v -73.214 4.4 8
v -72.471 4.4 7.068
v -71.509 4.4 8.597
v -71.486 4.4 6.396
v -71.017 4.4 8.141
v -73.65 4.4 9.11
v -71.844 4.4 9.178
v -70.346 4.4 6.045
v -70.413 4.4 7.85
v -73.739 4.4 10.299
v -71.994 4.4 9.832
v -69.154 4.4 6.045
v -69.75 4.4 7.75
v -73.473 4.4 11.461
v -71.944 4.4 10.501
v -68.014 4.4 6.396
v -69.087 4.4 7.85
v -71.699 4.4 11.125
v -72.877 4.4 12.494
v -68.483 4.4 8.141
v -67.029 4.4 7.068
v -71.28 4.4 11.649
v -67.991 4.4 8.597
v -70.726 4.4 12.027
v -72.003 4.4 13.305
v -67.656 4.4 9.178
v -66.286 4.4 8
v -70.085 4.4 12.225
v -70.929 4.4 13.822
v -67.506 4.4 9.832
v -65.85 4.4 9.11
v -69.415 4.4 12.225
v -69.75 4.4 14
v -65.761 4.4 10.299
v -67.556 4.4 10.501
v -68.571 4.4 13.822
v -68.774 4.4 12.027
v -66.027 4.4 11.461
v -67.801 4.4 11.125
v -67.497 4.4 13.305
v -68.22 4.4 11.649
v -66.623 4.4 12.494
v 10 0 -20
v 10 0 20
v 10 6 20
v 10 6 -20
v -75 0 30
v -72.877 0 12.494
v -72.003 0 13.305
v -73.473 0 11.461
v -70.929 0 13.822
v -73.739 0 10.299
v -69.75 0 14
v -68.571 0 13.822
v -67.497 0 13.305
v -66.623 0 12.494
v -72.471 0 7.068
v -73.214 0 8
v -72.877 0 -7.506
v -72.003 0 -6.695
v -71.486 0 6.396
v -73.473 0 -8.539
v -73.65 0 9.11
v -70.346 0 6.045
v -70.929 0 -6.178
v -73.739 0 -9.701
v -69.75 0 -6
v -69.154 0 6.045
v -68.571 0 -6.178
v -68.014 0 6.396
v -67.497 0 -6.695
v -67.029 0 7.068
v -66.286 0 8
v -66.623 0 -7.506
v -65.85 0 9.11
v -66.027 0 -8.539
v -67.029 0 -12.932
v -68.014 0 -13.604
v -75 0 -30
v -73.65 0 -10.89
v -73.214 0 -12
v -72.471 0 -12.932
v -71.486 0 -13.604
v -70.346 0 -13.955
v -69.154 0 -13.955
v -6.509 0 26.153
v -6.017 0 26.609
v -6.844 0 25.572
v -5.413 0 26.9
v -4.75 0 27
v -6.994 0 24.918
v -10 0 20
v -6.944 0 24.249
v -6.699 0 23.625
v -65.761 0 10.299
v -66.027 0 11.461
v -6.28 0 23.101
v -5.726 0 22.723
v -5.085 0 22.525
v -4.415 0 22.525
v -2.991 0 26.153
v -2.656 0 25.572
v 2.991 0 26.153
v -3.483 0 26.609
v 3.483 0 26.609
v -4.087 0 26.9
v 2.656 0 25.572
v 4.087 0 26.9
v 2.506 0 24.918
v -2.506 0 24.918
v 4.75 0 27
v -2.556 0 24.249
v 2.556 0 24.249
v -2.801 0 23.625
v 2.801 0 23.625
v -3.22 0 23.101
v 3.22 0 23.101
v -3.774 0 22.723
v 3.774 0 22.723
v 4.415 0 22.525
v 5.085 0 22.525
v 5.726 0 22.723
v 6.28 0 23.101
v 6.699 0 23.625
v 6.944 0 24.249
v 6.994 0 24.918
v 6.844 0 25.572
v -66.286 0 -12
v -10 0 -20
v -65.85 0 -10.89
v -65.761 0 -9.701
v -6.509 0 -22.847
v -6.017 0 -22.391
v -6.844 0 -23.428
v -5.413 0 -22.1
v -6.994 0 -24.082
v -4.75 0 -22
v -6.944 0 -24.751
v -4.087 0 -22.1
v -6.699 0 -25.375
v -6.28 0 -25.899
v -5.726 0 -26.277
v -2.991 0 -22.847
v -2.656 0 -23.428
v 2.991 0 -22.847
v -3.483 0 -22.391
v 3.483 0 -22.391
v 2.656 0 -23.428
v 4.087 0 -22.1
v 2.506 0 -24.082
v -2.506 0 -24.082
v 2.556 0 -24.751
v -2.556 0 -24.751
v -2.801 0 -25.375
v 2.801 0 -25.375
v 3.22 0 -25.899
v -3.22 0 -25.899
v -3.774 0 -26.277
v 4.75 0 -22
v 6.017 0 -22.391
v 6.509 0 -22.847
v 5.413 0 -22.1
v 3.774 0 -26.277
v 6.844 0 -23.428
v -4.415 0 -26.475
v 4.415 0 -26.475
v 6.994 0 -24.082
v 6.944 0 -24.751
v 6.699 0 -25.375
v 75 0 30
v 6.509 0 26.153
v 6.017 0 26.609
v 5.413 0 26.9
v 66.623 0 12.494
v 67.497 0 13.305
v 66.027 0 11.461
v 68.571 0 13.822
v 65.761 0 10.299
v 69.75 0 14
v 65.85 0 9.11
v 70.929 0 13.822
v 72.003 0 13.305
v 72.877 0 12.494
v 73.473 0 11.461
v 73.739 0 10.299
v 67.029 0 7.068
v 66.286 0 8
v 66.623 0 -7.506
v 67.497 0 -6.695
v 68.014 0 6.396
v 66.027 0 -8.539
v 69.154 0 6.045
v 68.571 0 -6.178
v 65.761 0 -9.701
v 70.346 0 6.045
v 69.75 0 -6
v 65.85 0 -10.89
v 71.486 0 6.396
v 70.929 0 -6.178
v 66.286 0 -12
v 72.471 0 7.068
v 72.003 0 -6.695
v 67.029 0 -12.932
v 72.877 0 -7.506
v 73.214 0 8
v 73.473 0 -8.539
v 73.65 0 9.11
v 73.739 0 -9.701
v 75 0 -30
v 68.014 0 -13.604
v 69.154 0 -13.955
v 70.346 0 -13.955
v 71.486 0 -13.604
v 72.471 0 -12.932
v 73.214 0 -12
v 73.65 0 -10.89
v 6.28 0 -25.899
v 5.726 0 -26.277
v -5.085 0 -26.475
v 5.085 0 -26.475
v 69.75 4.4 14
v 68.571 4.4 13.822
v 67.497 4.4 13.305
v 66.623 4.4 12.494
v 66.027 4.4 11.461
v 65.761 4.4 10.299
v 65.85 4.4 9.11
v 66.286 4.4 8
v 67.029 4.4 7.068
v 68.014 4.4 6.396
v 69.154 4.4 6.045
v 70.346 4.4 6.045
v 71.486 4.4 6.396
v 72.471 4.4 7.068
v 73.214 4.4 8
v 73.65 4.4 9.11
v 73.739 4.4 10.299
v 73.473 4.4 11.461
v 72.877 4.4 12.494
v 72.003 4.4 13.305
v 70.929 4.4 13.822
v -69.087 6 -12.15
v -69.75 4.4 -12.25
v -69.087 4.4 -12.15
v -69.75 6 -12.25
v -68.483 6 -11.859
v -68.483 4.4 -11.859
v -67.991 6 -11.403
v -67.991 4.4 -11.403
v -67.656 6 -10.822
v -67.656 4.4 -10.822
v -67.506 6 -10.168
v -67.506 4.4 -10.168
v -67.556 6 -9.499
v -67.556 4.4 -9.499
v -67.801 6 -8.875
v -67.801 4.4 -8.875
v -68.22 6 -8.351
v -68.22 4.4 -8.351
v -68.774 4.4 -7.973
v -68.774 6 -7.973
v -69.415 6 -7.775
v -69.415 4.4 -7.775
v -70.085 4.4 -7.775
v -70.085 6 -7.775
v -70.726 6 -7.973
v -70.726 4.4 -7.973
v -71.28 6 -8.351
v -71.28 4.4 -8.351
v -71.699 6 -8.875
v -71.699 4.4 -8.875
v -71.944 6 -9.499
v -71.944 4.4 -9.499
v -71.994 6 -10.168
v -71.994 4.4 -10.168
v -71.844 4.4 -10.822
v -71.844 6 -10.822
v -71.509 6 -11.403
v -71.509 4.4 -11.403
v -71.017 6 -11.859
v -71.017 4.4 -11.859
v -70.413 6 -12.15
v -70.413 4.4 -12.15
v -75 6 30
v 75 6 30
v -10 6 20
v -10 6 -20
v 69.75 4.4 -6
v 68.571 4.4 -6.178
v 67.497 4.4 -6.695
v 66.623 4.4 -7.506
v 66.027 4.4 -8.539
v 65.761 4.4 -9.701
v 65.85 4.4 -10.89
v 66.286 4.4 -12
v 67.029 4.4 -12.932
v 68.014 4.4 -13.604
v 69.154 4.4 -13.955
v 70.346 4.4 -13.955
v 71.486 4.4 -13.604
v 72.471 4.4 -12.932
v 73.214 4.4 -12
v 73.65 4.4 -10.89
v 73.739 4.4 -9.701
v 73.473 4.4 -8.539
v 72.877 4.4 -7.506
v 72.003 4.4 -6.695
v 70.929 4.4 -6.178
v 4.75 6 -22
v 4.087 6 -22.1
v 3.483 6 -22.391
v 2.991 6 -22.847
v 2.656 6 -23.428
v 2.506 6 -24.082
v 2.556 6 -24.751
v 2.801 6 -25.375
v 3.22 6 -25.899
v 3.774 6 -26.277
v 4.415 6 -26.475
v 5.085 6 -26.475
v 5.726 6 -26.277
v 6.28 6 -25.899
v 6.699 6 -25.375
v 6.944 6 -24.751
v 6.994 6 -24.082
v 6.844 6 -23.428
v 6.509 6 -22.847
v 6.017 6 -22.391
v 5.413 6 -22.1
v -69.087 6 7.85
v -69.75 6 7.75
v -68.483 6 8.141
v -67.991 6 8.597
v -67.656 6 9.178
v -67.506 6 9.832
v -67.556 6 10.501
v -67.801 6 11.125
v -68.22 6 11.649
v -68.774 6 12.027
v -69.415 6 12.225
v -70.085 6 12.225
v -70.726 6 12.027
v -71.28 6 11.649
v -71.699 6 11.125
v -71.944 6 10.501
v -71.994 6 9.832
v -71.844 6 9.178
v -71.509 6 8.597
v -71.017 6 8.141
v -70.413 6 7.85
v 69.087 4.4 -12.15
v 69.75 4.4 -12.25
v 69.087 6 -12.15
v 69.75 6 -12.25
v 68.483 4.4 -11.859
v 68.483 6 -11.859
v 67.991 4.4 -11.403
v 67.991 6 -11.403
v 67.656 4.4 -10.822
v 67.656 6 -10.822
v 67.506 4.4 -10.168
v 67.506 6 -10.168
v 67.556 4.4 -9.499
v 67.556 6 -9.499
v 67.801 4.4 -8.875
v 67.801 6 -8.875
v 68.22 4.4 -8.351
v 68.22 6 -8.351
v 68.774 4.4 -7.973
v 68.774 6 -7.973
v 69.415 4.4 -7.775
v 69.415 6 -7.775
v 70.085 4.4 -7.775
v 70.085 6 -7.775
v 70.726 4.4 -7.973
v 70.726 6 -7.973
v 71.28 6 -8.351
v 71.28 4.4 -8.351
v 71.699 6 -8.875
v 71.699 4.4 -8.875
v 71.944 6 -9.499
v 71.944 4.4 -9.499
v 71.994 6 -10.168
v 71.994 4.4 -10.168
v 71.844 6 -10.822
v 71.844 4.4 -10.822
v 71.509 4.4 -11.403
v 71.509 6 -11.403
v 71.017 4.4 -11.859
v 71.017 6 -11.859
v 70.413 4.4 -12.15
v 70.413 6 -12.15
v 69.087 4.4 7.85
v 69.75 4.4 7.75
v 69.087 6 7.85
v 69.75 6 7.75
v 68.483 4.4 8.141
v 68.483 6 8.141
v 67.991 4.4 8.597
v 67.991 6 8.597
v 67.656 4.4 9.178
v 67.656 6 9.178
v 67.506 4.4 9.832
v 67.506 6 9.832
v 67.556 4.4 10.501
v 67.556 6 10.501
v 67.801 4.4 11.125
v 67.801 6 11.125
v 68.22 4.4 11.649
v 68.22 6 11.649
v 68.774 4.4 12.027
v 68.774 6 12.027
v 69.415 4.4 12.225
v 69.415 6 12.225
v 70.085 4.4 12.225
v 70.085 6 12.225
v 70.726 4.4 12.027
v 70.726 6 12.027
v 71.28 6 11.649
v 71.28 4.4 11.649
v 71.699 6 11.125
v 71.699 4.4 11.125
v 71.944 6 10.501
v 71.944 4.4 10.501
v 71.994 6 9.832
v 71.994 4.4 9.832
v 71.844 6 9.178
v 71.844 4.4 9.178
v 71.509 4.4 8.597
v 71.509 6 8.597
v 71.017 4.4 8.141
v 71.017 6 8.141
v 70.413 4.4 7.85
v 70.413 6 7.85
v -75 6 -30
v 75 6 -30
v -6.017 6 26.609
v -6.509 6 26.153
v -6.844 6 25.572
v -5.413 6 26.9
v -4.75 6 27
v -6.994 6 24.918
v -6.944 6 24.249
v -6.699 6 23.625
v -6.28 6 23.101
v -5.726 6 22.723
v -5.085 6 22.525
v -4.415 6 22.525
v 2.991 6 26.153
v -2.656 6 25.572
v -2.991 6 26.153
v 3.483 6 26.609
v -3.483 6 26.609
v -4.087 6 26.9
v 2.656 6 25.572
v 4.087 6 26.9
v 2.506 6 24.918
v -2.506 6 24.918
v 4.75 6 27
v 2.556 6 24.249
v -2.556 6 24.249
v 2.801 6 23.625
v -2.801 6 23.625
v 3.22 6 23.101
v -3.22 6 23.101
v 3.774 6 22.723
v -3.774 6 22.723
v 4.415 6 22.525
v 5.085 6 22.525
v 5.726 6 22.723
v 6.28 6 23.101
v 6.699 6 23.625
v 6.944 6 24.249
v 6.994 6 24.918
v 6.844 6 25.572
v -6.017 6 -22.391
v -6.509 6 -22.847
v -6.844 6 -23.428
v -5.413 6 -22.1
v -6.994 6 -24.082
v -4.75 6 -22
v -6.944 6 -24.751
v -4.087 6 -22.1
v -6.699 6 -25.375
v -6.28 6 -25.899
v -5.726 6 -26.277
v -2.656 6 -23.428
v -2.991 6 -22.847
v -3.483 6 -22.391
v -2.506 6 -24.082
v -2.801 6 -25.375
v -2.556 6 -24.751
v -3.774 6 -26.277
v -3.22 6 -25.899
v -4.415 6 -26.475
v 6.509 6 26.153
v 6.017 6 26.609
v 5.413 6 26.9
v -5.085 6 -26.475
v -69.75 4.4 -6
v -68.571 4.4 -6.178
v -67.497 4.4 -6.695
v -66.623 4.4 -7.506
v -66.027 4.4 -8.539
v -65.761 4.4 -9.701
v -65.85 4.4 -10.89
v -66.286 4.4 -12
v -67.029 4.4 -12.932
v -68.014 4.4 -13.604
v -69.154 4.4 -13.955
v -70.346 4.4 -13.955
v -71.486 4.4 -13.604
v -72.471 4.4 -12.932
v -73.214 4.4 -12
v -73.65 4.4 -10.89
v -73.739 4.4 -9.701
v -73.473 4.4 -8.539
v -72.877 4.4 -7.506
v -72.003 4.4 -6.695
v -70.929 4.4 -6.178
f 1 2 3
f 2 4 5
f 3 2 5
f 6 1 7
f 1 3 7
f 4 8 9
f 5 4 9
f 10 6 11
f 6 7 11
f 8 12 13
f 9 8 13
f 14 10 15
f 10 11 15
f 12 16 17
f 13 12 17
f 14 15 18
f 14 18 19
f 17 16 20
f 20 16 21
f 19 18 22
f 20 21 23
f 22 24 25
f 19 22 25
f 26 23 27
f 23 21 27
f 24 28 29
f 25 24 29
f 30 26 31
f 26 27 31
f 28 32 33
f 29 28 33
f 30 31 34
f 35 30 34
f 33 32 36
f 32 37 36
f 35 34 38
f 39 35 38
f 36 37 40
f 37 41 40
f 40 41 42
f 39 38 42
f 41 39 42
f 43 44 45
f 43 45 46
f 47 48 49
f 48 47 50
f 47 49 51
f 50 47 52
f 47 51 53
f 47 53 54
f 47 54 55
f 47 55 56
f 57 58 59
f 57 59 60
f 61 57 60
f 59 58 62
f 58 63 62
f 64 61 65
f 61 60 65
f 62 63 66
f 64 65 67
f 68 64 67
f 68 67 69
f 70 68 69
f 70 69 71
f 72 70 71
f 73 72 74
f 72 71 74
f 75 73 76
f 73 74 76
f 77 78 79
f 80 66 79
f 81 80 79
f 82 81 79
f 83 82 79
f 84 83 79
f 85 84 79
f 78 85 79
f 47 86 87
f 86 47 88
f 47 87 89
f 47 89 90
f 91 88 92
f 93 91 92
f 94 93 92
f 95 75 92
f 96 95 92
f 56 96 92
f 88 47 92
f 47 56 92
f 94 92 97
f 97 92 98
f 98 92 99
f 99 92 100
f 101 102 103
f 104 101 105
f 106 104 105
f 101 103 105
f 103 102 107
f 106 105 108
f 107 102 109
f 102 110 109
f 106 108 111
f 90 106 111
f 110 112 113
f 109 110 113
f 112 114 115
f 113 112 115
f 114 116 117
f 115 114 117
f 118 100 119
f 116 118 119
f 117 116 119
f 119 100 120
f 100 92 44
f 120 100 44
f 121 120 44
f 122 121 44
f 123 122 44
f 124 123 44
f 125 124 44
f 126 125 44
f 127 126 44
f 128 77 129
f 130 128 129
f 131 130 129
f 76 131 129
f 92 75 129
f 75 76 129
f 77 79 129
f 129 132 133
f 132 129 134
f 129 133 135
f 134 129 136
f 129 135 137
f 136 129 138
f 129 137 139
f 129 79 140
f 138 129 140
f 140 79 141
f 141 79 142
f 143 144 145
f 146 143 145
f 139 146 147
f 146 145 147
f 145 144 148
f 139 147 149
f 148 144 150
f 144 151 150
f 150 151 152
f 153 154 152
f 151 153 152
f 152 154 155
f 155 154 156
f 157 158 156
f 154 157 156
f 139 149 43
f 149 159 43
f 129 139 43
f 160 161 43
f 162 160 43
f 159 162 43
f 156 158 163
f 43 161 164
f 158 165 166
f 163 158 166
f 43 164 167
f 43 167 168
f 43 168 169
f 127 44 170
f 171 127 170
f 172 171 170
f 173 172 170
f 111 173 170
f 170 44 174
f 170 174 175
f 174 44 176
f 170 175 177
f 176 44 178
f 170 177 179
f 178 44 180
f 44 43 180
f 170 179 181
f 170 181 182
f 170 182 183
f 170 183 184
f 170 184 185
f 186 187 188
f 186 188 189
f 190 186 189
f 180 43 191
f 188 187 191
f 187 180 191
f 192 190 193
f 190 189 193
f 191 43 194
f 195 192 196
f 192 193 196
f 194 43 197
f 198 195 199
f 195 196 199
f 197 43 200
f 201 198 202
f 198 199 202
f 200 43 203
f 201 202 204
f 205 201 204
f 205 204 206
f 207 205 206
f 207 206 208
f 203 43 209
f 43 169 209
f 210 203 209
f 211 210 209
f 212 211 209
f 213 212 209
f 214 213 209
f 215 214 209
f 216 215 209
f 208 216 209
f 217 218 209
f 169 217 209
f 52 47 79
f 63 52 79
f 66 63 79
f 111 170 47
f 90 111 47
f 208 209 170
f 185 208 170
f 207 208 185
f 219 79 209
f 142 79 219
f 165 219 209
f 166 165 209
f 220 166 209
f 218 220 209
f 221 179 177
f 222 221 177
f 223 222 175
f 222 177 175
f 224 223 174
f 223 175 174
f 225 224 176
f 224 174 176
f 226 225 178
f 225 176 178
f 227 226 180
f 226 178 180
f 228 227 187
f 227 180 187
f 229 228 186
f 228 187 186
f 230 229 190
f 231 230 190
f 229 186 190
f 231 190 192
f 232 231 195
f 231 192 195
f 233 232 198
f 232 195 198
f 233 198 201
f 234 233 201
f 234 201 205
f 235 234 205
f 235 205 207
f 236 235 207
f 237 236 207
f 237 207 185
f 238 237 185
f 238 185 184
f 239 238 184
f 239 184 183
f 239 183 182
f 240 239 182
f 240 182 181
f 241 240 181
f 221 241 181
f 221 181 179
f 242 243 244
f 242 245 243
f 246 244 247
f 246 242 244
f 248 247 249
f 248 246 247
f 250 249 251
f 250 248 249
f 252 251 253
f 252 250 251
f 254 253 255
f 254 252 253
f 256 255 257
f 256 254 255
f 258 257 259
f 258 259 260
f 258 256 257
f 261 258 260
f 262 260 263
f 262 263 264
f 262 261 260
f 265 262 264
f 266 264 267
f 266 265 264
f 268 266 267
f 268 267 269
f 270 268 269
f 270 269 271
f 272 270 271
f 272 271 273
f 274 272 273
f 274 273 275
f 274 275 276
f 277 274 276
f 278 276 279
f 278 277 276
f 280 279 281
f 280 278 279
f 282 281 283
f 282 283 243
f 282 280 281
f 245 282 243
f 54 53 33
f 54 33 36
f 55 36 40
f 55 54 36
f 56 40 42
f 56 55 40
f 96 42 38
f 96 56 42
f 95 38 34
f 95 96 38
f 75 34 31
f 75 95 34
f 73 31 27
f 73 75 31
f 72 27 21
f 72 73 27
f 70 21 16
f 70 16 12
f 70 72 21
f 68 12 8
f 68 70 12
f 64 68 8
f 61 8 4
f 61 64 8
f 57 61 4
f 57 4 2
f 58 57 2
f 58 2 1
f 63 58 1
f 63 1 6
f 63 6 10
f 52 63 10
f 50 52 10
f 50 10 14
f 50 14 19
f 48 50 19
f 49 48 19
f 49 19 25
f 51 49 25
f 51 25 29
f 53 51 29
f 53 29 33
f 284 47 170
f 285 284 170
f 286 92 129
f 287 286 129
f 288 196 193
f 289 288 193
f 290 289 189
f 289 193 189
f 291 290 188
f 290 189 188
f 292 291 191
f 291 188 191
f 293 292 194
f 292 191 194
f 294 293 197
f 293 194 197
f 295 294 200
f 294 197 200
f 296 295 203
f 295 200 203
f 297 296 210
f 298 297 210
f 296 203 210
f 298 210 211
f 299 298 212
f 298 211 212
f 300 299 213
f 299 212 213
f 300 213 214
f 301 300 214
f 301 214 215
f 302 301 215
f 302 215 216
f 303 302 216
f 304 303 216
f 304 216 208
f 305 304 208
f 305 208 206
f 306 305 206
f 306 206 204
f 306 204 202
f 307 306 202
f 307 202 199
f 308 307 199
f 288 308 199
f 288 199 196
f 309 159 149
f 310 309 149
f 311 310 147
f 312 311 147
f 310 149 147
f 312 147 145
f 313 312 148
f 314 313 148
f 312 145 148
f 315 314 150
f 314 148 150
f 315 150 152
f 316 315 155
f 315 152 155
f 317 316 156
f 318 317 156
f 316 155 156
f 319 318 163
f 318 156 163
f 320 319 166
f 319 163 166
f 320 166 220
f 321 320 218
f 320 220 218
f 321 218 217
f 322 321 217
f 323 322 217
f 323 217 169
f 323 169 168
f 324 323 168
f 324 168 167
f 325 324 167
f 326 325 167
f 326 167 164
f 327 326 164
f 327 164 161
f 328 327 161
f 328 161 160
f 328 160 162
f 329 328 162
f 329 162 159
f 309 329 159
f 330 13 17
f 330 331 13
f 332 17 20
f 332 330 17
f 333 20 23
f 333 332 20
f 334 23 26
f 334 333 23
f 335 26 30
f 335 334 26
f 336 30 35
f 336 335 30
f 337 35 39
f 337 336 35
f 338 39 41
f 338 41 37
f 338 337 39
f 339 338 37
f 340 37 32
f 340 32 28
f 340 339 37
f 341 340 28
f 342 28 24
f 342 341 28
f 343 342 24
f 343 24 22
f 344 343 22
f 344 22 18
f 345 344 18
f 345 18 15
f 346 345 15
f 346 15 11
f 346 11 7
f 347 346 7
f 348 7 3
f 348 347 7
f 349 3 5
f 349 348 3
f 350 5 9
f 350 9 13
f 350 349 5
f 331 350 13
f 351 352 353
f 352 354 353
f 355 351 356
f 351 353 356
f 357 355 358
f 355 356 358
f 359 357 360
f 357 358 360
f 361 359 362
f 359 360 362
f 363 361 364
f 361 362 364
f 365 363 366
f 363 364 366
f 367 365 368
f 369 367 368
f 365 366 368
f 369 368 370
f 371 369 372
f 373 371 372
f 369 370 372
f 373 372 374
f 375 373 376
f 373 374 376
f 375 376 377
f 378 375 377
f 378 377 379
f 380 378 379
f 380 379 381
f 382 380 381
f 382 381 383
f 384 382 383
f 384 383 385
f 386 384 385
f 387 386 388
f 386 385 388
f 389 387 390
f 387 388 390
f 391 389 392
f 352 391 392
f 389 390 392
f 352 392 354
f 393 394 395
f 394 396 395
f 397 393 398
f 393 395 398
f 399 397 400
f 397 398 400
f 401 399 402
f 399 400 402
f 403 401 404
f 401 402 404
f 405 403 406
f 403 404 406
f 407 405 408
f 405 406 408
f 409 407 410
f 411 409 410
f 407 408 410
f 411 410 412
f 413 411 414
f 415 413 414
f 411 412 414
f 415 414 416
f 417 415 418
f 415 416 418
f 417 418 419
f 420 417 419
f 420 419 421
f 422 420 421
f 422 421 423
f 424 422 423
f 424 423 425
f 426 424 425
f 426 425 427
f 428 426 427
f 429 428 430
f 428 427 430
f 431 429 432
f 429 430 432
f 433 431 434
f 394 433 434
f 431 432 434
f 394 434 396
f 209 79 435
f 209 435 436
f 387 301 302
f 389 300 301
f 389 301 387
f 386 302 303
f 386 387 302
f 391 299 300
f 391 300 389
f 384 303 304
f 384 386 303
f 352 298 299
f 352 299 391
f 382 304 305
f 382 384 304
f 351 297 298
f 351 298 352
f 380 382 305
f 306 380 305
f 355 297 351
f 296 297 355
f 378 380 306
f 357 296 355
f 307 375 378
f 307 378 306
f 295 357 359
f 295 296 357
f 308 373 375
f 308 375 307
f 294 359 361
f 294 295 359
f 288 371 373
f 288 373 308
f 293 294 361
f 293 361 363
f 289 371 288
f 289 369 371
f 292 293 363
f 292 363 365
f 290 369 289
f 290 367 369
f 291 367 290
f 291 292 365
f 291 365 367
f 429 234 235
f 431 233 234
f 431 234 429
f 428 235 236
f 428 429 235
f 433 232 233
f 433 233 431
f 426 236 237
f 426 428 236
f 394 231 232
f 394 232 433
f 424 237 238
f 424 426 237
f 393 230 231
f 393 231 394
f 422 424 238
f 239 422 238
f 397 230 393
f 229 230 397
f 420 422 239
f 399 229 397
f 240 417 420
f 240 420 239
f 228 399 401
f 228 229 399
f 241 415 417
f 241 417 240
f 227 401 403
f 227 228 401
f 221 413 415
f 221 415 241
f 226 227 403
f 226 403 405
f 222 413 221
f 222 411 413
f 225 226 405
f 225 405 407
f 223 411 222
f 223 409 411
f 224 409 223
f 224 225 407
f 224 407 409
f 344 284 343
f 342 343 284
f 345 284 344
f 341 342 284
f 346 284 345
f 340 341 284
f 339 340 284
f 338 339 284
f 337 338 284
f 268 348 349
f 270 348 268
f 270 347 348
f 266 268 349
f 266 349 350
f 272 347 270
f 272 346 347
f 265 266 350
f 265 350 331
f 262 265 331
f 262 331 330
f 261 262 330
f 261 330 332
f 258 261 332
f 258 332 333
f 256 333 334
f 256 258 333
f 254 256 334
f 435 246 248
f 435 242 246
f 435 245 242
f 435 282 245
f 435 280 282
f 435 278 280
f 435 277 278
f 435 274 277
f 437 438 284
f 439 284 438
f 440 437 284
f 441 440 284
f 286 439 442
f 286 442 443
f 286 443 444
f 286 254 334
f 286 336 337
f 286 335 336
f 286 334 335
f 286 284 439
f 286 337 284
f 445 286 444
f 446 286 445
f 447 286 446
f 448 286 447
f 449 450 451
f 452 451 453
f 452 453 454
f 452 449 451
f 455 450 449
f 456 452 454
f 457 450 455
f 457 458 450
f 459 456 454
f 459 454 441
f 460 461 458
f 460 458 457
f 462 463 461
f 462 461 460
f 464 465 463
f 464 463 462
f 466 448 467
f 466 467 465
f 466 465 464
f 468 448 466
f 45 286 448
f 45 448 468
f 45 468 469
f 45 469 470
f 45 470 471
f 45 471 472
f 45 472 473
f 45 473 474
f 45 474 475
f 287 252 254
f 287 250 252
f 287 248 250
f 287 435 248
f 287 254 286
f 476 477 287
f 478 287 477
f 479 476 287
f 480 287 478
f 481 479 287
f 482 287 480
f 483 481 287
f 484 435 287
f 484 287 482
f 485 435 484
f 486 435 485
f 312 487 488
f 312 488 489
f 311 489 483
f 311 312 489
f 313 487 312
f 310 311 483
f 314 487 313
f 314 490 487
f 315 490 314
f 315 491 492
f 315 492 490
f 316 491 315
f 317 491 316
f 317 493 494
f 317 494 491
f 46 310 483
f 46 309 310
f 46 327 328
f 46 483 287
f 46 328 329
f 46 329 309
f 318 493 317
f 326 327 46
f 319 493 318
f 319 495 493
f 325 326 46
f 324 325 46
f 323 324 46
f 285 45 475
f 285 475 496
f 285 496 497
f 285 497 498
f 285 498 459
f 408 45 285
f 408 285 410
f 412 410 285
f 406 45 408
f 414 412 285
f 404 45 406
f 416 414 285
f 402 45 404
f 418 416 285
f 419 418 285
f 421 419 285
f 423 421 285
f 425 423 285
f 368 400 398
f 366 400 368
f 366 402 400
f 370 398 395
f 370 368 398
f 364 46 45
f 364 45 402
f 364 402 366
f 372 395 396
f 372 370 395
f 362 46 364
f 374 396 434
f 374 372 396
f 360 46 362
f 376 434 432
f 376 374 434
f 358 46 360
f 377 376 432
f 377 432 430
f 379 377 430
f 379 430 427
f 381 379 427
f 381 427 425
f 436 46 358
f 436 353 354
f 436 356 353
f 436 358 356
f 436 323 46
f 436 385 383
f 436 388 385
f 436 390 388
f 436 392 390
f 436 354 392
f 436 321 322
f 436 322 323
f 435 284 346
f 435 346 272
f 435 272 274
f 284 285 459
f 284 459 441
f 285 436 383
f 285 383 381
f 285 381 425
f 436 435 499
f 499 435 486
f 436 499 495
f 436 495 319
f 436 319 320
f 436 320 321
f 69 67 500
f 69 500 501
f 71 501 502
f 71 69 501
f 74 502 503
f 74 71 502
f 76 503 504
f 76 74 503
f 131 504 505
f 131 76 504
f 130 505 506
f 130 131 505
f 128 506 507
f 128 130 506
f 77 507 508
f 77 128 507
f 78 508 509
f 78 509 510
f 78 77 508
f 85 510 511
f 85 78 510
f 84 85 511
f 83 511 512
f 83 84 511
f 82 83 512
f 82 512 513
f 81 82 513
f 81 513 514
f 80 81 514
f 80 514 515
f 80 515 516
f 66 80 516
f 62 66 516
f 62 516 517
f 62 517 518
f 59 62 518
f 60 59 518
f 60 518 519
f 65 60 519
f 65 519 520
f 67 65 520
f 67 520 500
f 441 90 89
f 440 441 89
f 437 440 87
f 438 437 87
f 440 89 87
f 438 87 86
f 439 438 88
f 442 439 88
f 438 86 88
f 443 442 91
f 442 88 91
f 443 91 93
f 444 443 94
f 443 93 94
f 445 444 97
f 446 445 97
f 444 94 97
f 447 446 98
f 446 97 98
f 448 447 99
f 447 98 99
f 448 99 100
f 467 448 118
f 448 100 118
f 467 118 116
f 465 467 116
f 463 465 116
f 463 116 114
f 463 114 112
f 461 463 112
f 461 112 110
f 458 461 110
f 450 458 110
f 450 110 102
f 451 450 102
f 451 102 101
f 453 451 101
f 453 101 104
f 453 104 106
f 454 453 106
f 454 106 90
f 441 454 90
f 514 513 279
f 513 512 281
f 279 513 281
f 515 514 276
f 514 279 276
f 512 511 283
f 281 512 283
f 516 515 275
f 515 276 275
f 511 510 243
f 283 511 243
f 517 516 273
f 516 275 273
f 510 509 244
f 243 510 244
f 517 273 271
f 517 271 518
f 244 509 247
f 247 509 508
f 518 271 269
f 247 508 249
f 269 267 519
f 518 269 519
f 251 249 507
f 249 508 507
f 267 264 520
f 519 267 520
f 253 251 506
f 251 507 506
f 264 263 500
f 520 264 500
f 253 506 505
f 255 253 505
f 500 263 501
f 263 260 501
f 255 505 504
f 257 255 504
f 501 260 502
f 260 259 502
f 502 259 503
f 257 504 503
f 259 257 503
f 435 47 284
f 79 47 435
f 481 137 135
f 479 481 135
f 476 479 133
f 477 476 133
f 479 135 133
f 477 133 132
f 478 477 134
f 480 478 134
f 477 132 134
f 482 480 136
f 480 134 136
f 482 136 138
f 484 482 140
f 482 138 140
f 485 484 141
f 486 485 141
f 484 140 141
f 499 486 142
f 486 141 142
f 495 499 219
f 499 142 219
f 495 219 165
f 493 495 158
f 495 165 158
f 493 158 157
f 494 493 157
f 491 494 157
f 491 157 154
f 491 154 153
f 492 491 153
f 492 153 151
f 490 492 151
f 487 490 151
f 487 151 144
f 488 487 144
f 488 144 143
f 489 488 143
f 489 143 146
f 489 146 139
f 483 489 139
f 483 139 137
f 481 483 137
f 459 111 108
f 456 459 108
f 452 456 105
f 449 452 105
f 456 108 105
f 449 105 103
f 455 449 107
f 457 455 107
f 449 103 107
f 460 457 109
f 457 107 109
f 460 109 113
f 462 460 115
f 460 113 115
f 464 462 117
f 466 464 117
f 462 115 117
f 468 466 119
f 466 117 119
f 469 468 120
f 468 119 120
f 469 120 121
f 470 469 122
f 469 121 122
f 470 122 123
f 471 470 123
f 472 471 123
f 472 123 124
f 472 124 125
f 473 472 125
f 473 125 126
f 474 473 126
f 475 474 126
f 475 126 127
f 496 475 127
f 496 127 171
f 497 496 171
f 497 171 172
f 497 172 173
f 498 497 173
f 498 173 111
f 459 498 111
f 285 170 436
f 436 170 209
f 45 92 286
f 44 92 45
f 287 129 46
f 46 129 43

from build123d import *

# Parameters (mm, degrees)
SKETCH1_W                                           = 150
SKETCH1_H                                           = 60
SKETCH1_W_2                                         = 20
SKETCH1_H_2                                         = 40
BOSS_EXTRUDE1_DEPTH                                 = 6
CBORE_FOR_M4_HEX_SOCKET_HEAD_CAP_SCREW1_D           = 4.5
CBORE_FOR_M4_HEX_SOCKET_HEAD_CAP_SCREW1_CBORE_D     = 8
CBORE_FOR_M4_HEX_SOCKET_HEAD_CAP_SCREW1_CBORE_DEPTH = 4.4
M4_CLEARANCE_HOLE1_D                                = 4.5
M4_CLEARANCE_HOLE1_DEPTH                            = 8.499


with BuildPart() as part:
    # Sketch1 → Boss-Extrude1 (new body)
    with BuildSketch(Plane(origin=(0, 0, 0), x_dir=(1, 0, 0), z_dir=(0, 1, 0))):
        Rectangle(SKETCH1_W, SKETCH1_H)
        Rectangle(SKETCH1_W_2, SKETCH1_H_2, mode=Mode.SUBTRACT)
    extrude(amount=BOSS_EXTRUDE1_DEPTH)

    # CBORE for M4 Hex Socket Head Cap Screw1 (through all)
    with Locations(Plane(origin=(0, 0, 178.229982134), x_dir=(0, 0, 1), z_dir=(0, -1, 0))):
        with Locations((-168.229982134, -69.75), (-188.229982134, -69.75)):
            cbore_for_m4_hex_socket_head_cap_screw1 = CounterBoreHole(CBORE_FOR_M4_HEX_SOCKET_HEAD_CAP_SCREW1_D / 2, CBORE_FOR_M4_HEX_SOCKET_HEAD_CAP_SCREW1_CBORE_D / 2, CBORE_FOR_M4_HEX_SOCKET_HEAD_CAP_SCREW1_CBORE_DEPTH)

    # Mirror2: CBORE for M4 Hex Socket Head Cap Screw1 across plane
    add(cbore_for_m4_hex_socket_head_cap_screw1.mirror(Plane.ZY), mode=Mode.SUBTRACT)

    # M4 Clearance Hole1
    with Locations(Plane(origin=(0, 6, 178.229982134), x_dir=(0, 0, -1), z_dir=(0, 1, 0))):
        with Locations((153.479982134, 4.75), (153.479982134, -4.75), (202.479982134, -4.75), (202.479982134, 4.75)):
            Hole(M4_CLEARANCE_HOLE1_D / 2, depth=M4_CLEARANCE_HOLE1_DEPTH)


solid = part.part
